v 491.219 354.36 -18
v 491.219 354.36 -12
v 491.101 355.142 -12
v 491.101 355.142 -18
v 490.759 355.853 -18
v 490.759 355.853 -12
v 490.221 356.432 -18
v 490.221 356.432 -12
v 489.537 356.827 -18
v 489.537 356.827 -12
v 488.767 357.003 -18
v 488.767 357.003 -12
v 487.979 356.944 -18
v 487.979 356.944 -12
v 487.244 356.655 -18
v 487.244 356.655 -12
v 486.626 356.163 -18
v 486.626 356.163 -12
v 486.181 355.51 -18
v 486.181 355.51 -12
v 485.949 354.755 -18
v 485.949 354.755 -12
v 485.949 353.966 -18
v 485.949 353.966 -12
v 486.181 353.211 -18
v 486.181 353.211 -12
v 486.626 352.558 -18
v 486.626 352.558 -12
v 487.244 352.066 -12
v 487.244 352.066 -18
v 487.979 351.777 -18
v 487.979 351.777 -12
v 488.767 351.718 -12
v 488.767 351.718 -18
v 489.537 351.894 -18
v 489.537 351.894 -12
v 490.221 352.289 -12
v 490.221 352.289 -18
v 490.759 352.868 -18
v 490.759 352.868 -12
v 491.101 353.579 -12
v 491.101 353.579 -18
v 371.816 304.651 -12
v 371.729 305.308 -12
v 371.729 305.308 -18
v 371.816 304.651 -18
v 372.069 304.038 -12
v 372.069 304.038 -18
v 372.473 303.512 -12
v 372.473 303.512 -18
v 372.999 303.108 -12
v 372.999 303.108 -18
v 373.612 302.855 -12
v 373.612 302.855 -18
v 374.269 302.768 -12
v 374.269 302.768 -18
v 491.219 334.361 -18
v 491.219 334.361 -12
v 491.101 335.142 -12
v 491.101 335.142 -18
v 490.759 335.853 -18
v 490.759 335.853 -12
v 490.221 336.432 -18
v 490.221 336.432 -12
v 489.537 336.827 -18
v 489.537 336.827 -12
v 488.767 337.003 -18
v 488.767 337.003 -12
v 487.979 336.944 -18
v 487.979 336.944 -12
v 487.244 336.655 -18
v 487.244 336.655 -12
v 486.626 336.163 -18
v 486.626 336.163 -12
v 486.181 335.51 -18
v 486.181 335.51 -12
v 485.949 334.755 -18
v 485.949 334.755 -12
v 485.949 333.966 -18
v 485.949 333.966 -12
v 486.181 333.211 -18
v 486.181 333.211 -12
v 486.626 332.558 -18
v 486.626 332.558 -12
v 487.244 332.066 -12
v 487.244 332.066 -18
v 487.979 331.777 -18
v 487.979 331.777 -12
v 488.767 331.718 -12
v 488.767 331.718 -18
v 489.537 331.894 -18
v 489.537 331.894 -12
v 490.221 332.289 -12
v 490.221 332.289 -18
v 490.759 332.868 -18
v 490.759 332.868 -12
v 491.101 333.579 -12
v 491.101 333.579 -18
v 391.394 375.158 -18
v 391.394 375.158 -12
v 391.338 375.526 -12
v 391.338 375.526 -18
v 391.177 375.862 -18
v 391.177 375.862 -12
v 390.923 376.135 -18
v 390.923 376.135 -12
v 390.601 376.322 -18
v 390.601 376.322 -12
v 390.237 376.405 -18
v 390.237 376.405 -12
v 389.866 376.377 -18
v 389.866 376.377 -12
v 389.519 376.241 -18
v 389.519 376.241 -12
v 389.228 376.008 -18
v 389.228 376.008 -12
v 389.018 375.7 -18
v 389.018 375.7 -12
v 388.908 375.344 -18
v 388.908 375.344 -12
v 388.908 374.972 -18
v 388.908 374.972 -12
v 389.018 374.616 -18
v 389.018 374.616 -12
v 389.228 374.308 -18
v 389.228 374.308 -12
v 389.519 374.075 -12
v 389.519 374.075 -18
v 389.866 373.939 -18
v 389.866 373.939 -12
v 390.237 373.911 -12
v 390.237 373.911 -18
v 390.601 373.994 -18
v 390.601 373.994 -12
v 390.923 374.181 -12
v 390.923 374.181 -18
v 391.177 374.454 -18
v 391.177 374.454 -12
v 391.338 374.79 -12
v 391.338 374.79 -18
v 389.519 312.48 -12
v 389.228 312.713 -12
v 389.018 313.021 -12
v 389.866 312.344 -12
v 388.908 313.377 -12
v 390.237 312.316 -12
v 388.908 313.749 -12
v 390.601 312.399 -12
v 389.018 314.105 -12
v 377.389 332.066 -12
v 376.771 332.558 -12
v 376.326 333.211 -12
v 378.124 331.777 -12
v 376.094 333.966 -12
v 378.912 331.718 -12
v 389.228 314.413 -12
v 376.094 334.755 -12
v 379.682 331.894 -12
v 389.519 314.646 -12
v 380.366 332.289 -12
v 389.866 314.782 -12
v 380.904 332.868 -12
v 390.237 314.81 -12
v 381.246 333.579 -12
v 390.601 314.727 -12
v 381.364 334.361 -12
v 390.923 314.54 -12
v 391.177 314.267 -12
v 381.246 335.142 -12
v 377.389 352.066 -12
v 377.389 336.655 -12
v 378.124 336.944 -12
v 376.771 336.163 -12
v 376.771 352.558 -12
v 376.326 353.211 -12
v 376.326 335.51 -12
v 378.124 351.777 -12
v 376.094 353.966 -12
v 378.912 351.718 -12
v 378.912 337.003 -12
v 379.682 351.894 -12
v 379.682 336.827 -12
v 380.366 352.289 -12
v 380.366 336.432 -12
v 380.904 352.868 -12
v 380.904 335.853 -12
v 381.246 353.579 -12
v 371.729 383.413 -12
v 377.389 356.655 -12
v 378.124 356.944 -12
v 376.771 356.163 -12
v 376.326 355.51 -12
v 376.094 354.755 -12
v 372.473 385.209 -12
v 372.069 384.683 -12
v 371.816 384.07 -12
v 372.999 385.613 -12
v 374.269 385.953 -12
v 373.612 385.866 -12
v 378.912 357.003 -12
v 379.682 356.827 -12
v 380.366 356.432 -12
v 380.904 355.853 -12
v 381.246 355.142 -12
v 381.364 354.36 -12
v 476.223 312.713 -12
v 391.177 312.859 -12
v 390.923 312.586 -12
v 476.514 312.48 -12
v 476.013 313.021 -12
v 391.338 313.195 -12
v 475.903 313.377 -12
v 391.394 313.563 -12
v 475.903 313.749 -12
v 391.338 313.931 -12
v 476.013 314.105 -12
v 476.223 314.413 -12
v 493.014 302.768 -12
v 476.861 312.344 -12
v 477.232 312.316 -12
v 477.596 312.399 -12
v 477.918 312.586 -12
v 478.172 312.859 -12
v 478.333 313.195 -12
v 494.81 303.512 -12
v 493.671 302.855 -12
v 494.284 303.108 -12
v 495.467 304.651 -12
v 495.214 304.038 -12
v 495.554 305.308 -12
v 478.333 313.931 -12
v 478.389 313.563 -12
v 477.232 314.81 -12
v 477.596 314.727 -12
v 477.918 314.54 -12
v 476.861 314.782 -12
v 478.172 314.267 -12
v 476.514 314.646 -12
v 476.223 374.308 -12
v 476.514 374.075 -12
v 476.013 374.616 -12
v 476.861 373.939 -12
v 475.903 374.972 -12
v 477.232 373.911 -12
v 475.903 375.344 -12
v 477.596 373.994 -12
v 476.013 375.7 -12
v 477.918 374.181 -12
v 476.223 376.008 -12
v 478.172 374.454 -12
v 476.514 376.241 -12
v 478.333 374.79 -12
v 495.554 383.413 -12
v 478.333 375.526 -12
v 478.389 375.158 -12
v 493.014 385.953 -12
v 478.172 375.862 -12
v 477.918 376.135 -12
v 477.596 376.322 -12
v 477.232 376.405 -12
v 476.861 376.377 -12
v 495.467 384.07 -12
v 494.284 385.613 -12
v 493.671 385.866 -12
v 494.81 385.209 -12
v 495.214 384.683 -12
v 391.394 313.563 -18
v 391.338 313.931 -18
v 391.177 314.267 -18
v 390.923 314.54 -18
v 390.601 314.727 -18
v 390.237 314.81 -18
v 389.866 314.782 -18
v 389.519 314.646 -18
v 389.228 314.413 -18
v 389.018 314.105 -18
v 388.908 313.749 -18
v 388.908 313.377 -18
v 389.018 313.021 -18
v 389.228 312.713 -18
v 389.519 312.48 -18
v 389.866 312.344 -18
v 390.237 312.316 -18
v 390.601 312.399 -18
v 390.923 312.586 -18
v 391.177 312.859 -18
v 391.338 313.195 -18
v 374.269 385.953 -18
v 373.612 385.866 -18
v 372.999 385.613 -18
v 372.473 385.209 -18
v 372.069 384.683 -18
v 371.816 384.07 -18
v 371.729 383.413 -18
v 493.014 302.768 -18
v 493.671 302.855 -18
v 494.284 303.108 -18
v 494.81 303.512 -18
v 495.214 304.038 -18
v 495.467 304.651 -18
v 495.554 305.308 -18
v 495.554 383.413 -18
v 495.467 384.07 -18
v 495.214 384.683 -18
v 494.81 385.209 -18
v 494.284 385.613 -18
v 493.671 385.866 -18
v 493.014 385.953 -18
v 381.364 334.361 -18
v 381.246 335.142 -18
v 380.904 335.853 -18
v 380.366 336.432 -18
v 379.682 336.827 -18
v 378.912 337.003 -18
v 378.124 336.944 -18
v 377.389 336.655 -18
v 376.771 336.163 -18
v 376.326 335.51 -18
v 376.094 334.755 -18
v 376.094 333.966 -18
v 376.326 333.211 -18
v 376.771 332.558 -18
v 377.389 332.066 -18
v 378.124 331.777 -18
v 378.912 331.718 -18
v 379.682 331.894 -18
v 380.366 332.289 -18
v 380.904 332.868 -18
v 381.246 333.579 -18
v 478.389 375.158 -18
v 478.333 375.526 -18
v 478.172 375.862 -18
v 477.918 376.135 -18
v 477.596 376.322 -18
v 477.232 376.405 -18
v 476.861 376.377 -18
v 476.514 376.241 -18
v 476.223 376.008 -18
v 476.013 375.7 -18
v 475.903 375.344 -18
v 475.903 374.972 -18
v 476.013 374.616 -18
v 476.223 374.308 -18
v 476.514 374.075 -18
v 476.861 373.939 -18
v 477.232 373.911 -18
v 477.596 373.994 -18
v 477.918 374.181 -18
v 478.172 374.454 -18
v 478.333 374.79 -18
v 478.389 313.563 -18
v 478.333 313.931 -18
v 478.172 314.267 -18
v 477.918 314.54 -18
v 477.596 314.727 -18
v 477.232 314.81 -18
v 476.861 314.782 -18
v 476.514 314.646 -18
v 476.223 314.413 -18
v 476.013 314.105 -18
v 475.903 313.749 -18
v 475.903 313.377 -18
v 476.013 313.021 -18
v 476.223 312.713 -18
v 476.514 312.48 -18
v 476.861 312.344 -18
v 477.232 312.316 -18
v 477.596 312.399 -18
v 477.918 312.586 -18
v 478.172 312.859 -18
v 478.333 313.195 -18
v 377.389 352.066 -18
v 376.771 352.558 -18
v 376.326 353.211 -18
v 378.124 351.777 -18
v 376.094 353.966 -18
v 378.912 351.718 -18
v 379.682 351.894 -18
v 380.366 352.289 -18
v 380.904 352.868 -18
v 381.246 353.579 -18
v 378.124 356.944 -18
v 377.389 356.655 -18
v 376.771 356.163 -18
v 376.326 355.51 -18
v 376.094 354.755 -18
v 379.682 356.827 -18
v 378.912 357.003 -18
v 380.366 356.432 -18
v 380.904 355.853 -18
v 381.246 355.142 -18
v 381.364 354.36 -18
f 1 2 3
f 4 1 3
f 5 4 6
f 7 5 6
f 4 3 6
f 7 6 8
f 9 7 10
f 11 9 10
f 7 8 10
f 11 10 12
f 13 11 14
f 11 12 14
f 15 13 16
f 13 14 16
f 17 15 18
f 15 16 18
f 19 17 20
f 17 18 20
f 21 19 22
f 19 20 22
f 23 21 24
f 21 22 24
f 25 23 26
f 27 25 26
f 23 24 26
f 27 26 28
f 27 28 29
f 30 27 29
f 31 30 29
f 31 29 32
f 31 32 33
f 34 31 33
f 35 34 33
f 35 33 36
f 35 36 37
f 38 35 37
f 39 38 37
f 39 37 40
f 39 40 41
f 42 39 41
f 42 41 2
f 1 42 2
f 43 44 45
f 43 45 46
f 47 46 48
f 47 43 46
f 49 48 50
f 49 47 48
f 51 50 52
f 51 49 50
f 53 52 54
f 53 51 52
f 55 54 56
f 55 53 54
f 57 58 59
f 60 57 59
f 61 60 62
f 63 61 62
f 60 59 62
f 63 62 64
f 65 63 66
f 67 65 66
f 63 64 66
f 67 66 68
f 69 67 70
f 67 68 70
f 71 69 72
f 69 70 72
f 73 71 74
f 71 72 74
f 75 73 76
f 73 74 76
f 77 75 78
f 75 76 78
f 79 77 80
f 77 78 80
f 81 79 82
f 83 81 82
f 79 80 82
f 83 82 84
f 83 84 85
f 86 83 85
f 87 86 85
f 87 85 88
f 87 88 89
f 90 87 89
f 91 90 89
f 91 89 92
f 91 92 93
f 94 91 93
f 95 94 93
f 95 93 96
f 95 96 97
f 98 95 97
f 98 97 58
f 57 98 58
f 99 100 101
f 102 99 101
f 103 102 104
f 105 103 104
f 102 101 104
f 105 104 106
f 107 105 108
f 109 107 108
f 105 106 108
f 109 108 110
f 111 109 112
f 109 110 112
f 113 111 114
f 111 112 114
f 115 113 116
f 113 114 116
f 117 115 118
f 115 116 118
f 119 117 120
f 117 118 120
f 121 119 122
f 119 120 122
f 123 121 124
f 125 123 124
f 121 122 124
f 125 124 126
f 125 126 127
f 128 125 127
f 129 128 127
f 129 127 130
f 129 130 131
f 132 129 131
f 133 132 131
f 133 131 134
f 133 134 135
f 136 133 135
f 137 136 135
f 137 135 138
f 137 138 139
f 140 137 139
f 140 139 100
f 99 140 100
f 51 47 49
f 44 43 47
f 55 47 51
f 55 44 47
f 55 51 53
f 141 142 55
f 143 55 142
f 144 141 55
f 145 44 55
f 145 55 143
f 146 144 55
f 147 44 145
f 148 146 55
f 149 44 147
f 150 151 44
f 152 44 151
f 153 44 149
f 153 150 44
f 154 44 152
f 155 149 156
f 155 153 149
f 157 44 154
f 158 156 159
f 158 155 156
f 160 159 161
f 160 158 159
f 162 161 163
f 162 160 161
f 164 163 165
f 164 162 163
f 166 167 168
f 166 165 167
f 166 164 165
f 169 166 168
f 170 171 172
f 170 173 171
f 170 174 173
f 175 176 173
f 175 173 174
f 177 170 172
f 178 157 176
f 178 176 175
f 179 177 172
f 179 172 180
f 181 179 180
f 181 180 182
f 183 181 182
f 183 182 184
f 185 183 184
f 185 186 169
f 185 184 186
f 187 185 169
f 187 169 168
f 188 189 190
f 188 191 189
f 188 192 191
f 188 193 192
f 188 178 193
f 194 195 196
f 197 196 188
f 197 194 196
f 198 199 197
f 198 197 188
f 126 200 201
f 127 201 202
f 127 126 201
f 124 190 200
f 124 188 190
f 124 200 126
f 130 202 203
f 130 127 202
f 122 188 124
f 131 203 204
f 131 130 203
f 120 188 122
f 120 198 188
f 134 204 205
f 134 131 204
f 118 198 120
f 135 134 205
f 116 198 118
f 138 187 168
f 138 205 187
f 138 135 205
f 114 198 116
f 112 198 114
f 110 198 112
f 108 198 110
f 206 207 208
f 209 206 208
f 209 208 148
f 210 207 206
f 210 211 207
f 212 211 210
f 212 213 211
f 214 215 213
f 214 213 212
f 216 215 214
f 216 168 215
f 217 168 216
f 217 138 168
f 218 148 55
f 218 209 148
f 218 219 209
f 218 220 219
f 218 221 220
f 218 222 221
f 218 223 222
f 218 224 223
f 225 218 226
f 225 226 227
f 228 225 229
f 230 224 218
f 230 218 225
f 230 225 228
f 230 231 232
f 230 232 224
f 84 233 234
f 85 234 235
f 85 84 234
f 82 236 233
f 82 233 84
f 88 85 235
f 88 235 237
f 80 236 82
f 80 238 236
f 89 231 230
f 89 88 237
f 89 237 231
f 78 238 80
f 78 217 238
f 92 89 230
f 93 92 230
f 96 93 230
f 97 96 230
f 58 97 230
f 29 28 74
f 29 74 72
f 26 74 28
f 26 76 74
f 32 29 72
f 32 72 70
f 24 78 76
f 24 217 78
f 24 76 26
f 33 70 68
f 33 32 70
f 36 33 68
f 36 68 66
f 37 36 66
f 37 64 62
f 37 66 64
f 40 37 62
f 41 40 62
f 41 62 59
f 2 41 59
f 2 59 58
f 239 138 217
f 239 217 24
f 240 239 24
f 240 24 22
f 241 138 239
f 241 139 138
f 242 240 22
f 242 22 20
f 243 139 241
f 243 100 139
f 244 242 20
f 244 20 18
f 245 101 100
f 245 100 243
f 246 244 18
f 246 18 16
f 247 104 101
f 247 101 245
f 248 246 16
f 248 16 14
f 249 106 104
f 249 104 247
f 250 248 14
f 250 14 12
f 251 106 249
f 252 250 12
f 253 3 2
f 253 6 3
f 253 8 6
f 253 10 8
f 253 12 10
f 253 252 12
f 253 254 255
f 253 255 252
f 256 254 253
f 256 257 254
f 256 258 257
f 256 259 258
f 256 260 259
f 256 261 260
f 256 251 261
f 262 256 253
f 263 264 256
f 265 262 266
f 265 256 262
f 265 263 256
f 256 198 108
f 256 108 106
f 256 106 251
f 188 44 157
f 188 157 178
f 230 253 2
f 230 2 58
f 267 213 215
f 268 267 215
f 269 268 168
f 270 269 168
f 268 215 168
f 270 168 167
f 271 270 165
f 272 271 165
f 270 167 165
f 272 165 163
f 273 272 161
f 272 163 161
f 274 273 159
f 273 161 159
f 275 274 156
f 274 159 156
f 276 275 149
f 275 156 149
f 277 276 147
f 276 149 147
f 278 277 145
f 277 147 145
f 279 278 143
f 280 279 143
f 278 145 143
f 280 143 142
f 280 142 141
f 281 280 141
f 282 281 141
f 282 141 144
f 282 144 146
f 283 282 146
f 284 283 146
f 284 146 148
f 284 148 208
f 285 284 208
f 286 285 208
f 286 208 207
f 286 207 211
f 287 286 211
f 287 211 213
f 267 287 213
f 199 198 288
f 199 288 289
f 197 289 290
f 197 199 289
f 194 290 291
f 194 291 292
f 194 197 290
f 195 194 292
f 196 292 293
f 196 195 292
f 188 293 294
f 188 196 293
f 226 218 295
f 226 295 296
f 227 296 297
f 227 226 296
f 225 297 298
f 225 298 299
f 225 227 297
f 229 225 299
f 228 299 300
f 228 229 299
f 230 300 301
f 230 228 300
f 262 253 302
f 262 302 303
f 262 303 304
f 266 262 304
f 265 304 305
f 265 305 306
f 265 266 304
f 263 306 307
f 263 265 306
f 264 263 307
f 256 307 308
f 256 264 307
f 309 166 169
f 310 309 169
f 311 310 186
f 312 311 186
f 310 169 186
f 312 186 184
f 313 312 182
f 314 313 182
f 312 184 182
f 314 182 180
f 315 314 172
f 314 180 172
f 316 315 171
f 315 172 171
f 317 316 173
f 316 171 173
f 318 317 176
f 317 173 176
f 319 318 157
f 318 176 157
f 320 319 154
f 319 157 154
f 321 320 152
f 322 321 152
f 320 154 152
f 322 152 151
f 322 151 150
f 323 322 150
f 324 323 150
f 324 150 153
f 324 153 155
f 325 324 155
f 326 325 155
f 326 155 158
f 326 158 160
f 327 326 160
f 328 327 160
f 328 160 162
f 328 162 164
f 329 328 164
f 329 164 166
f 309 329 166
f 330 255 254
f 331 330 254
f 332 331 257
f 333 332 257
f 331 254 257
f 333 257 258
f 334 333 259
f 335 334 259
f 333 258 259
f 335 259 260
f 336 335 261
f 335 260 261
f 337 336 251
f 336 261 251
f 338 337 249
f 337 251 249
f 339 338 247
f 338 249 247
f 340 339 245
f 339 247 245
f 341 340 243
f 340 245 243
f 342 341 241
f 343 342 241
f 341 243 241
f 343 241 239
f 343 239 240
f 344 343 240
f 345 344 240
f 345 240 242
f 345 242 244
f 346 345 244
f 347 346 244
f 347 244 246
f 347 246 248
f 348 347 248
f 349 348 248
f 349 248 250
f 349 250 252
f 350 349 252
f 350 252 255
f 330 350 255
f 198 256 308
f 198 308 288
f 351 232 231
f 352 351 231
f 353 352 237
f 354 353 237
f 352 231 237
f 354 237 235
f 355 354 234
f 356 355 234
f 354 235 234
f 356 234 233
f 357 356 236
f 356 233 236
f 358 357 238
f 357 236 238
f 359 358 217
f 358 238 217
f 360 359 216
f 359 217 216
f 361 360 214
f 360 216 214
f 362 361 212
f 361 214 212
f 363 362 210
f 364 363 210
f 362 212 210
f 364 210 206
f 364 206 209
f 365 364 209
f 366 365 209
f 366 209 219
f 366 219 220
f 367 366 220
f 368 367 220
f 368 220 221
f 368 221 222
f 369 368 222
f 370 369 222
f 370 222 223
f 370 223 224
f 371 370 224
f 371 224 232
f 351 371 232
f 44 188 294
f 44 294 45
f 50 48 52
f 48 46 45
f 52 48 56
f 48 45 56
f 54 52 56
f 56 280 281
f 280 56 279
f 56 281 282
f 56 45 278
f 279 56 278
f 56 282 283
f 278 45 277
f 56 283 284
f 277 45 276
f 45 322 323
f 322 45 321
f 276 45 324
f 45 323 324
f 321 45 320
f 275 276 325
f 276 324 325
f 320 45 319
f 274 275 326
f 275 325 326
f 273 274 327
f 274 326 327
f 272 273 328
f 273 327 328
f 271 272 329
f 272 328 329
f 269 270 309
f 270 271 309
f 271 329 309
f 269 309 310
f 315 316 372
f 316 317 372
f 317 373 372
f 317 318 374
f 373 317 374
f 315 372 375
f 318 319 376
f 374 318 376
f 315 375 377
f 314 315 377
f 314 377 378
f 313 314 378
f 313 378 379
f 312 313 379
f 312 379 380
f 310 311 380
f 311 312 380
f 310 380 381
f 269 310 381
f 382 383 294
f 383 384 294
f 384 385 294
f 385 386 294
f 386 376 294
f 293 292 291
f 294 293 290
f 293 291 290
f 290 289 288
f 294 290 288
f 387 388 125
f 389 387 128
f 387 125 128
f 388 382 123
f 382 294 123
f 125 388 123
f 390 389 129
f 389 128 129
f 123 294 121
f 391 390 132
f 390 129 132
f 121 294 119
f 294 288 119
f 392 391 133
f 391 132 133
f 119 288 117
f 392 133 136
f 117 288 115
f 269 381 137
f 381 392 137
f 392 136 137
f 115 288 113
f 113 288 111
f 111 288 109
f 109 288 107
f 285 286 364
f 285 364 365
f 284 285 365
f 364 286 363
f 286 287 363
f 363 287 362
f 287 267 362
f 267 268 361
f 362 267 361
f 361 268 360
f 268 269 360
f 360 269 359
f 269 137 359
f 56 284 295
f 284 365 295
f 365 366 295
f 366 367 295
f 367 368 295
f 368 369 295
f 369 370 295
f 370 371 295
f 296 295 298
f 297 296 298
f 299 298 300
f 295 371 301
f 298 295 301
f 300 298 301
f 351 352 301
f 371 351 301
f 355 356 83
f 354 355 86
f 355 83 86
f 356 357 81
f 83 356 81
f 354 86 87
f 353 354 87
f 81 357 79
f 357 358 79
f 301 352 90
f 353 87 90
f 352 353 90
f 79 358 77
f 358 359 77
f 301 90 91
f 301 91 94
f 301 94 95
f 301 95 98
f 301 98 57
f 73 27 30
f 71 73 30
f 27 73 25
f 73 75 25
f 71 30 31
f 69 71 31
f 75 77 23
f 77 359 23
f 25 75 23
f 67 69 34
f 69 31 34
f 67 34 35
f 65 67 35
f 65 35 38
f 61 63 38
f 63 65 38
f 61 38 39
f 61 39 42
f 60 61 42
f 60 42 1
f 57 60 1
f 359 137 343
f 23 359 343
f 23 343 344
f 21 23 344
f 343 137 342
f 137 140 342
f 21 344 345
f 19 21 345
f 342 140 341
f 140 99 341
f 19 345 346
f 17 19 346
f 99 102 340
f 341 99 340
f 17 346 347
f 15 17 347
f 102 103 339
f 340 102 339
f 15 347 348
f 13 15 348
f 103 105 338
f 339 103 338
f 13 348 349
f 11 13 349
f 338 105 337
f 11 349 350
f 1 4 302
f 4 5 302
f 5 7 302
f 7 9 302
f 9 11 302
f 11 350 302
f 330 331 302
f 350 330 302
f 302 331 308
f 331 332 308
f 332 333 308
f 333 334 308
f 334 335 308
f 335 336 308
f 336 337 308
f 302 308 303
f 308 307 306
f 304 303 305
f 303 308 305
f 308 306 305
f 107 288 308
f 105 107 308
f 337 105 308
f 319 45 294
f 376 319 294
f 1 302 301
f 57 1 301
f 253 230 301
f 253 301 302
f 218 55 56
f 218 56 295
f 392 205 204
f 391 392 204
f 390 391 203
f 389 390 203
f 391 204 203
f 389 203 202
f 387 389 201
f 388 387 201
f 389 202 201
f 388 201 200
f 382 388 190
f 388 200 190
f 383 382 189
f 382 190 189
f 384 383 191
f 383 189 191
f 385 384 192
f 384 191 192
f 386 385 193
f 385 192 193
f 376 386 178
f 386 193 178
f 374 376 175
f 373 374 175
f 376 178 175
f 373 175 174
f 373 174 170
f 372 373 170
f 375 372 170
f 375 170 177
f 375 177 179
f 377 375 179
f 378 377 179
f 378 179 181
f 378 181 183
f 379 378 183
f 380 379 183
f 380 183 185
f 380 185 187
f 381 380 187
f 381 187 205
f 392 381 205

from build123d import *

# Parameters (mm, degrees)
BOSS_EXTRUDE1_DEPTH   = 6
M5_CLEARANCE_HOLE1_D  = 5.3
M3X0_5_TAPPED_HOLE1_D = 2.5


with BuildPart() as part:
    # Sketch1 → Boss-Extrude1 (new body)
    with BuildSketch(Plane(origin=(0, 0, -11.999999876), x_dir=(-1, 0, 0), z_dir=(0, 0, -1))):
        with BuildLine():
            Line((-493.014, 385.953), (-374.269, 385.953))
            ThreePointArc((-374.269, 385.953), (-372.472948776, 385.209051224), (-371.729, 383.413))
            Line((-371.729, 383.413), (-371.729, 305.308))
            ThreePointArc((-371.729, 305.308), (-372.472948776, 303.511948776), (-374.269, 302.768))
            Line((-374.269, 302.768), (-493.014, 302.768))
            ThreePointArc((-493.014, 302.768), (-494.810051224, 303.511948776), (-495.554, 305.308))
            Line((-495.554, 305.308), (-495.554, 383.413))
            ThreePointArc((-495.554, 383.413), (-494.810051224, 385.209051224), (-493.014, 385.953))
        make_face()
    extrude(amount=BOSS_EXTRUDE1_DEPTH)

    # M5 Clearance Hole1 (through all)
    with Locations(Plane(origin=(0, 0, -17.999999876), x_dir=(-1, 0, 0), z_dir=(0, 0, -1))):
        with Locations((-488.569, 354.360499939), (-488.569, 334.360500061), (-378.714, 334.360500061), (-378.714, 354.360499939)):
            Hole(M5_CLEARANCE_HOLE1_D / 2)

    # M3x0.5 Tapped Hole1 (through all)
    with Locations(Plane(origin=(0, 0, -17.999999876), x_dir=(-1, 0, 0), z_dir=(0, 0, -1))):
        with Locations((-477.139, 375.158), (-390.144, 375.158), (-390.144, 313.563), (-477.139, 313.563)):
            Hole(M3X0_5_TAPPED_HOLE1_D / 2)


solid = part.part
